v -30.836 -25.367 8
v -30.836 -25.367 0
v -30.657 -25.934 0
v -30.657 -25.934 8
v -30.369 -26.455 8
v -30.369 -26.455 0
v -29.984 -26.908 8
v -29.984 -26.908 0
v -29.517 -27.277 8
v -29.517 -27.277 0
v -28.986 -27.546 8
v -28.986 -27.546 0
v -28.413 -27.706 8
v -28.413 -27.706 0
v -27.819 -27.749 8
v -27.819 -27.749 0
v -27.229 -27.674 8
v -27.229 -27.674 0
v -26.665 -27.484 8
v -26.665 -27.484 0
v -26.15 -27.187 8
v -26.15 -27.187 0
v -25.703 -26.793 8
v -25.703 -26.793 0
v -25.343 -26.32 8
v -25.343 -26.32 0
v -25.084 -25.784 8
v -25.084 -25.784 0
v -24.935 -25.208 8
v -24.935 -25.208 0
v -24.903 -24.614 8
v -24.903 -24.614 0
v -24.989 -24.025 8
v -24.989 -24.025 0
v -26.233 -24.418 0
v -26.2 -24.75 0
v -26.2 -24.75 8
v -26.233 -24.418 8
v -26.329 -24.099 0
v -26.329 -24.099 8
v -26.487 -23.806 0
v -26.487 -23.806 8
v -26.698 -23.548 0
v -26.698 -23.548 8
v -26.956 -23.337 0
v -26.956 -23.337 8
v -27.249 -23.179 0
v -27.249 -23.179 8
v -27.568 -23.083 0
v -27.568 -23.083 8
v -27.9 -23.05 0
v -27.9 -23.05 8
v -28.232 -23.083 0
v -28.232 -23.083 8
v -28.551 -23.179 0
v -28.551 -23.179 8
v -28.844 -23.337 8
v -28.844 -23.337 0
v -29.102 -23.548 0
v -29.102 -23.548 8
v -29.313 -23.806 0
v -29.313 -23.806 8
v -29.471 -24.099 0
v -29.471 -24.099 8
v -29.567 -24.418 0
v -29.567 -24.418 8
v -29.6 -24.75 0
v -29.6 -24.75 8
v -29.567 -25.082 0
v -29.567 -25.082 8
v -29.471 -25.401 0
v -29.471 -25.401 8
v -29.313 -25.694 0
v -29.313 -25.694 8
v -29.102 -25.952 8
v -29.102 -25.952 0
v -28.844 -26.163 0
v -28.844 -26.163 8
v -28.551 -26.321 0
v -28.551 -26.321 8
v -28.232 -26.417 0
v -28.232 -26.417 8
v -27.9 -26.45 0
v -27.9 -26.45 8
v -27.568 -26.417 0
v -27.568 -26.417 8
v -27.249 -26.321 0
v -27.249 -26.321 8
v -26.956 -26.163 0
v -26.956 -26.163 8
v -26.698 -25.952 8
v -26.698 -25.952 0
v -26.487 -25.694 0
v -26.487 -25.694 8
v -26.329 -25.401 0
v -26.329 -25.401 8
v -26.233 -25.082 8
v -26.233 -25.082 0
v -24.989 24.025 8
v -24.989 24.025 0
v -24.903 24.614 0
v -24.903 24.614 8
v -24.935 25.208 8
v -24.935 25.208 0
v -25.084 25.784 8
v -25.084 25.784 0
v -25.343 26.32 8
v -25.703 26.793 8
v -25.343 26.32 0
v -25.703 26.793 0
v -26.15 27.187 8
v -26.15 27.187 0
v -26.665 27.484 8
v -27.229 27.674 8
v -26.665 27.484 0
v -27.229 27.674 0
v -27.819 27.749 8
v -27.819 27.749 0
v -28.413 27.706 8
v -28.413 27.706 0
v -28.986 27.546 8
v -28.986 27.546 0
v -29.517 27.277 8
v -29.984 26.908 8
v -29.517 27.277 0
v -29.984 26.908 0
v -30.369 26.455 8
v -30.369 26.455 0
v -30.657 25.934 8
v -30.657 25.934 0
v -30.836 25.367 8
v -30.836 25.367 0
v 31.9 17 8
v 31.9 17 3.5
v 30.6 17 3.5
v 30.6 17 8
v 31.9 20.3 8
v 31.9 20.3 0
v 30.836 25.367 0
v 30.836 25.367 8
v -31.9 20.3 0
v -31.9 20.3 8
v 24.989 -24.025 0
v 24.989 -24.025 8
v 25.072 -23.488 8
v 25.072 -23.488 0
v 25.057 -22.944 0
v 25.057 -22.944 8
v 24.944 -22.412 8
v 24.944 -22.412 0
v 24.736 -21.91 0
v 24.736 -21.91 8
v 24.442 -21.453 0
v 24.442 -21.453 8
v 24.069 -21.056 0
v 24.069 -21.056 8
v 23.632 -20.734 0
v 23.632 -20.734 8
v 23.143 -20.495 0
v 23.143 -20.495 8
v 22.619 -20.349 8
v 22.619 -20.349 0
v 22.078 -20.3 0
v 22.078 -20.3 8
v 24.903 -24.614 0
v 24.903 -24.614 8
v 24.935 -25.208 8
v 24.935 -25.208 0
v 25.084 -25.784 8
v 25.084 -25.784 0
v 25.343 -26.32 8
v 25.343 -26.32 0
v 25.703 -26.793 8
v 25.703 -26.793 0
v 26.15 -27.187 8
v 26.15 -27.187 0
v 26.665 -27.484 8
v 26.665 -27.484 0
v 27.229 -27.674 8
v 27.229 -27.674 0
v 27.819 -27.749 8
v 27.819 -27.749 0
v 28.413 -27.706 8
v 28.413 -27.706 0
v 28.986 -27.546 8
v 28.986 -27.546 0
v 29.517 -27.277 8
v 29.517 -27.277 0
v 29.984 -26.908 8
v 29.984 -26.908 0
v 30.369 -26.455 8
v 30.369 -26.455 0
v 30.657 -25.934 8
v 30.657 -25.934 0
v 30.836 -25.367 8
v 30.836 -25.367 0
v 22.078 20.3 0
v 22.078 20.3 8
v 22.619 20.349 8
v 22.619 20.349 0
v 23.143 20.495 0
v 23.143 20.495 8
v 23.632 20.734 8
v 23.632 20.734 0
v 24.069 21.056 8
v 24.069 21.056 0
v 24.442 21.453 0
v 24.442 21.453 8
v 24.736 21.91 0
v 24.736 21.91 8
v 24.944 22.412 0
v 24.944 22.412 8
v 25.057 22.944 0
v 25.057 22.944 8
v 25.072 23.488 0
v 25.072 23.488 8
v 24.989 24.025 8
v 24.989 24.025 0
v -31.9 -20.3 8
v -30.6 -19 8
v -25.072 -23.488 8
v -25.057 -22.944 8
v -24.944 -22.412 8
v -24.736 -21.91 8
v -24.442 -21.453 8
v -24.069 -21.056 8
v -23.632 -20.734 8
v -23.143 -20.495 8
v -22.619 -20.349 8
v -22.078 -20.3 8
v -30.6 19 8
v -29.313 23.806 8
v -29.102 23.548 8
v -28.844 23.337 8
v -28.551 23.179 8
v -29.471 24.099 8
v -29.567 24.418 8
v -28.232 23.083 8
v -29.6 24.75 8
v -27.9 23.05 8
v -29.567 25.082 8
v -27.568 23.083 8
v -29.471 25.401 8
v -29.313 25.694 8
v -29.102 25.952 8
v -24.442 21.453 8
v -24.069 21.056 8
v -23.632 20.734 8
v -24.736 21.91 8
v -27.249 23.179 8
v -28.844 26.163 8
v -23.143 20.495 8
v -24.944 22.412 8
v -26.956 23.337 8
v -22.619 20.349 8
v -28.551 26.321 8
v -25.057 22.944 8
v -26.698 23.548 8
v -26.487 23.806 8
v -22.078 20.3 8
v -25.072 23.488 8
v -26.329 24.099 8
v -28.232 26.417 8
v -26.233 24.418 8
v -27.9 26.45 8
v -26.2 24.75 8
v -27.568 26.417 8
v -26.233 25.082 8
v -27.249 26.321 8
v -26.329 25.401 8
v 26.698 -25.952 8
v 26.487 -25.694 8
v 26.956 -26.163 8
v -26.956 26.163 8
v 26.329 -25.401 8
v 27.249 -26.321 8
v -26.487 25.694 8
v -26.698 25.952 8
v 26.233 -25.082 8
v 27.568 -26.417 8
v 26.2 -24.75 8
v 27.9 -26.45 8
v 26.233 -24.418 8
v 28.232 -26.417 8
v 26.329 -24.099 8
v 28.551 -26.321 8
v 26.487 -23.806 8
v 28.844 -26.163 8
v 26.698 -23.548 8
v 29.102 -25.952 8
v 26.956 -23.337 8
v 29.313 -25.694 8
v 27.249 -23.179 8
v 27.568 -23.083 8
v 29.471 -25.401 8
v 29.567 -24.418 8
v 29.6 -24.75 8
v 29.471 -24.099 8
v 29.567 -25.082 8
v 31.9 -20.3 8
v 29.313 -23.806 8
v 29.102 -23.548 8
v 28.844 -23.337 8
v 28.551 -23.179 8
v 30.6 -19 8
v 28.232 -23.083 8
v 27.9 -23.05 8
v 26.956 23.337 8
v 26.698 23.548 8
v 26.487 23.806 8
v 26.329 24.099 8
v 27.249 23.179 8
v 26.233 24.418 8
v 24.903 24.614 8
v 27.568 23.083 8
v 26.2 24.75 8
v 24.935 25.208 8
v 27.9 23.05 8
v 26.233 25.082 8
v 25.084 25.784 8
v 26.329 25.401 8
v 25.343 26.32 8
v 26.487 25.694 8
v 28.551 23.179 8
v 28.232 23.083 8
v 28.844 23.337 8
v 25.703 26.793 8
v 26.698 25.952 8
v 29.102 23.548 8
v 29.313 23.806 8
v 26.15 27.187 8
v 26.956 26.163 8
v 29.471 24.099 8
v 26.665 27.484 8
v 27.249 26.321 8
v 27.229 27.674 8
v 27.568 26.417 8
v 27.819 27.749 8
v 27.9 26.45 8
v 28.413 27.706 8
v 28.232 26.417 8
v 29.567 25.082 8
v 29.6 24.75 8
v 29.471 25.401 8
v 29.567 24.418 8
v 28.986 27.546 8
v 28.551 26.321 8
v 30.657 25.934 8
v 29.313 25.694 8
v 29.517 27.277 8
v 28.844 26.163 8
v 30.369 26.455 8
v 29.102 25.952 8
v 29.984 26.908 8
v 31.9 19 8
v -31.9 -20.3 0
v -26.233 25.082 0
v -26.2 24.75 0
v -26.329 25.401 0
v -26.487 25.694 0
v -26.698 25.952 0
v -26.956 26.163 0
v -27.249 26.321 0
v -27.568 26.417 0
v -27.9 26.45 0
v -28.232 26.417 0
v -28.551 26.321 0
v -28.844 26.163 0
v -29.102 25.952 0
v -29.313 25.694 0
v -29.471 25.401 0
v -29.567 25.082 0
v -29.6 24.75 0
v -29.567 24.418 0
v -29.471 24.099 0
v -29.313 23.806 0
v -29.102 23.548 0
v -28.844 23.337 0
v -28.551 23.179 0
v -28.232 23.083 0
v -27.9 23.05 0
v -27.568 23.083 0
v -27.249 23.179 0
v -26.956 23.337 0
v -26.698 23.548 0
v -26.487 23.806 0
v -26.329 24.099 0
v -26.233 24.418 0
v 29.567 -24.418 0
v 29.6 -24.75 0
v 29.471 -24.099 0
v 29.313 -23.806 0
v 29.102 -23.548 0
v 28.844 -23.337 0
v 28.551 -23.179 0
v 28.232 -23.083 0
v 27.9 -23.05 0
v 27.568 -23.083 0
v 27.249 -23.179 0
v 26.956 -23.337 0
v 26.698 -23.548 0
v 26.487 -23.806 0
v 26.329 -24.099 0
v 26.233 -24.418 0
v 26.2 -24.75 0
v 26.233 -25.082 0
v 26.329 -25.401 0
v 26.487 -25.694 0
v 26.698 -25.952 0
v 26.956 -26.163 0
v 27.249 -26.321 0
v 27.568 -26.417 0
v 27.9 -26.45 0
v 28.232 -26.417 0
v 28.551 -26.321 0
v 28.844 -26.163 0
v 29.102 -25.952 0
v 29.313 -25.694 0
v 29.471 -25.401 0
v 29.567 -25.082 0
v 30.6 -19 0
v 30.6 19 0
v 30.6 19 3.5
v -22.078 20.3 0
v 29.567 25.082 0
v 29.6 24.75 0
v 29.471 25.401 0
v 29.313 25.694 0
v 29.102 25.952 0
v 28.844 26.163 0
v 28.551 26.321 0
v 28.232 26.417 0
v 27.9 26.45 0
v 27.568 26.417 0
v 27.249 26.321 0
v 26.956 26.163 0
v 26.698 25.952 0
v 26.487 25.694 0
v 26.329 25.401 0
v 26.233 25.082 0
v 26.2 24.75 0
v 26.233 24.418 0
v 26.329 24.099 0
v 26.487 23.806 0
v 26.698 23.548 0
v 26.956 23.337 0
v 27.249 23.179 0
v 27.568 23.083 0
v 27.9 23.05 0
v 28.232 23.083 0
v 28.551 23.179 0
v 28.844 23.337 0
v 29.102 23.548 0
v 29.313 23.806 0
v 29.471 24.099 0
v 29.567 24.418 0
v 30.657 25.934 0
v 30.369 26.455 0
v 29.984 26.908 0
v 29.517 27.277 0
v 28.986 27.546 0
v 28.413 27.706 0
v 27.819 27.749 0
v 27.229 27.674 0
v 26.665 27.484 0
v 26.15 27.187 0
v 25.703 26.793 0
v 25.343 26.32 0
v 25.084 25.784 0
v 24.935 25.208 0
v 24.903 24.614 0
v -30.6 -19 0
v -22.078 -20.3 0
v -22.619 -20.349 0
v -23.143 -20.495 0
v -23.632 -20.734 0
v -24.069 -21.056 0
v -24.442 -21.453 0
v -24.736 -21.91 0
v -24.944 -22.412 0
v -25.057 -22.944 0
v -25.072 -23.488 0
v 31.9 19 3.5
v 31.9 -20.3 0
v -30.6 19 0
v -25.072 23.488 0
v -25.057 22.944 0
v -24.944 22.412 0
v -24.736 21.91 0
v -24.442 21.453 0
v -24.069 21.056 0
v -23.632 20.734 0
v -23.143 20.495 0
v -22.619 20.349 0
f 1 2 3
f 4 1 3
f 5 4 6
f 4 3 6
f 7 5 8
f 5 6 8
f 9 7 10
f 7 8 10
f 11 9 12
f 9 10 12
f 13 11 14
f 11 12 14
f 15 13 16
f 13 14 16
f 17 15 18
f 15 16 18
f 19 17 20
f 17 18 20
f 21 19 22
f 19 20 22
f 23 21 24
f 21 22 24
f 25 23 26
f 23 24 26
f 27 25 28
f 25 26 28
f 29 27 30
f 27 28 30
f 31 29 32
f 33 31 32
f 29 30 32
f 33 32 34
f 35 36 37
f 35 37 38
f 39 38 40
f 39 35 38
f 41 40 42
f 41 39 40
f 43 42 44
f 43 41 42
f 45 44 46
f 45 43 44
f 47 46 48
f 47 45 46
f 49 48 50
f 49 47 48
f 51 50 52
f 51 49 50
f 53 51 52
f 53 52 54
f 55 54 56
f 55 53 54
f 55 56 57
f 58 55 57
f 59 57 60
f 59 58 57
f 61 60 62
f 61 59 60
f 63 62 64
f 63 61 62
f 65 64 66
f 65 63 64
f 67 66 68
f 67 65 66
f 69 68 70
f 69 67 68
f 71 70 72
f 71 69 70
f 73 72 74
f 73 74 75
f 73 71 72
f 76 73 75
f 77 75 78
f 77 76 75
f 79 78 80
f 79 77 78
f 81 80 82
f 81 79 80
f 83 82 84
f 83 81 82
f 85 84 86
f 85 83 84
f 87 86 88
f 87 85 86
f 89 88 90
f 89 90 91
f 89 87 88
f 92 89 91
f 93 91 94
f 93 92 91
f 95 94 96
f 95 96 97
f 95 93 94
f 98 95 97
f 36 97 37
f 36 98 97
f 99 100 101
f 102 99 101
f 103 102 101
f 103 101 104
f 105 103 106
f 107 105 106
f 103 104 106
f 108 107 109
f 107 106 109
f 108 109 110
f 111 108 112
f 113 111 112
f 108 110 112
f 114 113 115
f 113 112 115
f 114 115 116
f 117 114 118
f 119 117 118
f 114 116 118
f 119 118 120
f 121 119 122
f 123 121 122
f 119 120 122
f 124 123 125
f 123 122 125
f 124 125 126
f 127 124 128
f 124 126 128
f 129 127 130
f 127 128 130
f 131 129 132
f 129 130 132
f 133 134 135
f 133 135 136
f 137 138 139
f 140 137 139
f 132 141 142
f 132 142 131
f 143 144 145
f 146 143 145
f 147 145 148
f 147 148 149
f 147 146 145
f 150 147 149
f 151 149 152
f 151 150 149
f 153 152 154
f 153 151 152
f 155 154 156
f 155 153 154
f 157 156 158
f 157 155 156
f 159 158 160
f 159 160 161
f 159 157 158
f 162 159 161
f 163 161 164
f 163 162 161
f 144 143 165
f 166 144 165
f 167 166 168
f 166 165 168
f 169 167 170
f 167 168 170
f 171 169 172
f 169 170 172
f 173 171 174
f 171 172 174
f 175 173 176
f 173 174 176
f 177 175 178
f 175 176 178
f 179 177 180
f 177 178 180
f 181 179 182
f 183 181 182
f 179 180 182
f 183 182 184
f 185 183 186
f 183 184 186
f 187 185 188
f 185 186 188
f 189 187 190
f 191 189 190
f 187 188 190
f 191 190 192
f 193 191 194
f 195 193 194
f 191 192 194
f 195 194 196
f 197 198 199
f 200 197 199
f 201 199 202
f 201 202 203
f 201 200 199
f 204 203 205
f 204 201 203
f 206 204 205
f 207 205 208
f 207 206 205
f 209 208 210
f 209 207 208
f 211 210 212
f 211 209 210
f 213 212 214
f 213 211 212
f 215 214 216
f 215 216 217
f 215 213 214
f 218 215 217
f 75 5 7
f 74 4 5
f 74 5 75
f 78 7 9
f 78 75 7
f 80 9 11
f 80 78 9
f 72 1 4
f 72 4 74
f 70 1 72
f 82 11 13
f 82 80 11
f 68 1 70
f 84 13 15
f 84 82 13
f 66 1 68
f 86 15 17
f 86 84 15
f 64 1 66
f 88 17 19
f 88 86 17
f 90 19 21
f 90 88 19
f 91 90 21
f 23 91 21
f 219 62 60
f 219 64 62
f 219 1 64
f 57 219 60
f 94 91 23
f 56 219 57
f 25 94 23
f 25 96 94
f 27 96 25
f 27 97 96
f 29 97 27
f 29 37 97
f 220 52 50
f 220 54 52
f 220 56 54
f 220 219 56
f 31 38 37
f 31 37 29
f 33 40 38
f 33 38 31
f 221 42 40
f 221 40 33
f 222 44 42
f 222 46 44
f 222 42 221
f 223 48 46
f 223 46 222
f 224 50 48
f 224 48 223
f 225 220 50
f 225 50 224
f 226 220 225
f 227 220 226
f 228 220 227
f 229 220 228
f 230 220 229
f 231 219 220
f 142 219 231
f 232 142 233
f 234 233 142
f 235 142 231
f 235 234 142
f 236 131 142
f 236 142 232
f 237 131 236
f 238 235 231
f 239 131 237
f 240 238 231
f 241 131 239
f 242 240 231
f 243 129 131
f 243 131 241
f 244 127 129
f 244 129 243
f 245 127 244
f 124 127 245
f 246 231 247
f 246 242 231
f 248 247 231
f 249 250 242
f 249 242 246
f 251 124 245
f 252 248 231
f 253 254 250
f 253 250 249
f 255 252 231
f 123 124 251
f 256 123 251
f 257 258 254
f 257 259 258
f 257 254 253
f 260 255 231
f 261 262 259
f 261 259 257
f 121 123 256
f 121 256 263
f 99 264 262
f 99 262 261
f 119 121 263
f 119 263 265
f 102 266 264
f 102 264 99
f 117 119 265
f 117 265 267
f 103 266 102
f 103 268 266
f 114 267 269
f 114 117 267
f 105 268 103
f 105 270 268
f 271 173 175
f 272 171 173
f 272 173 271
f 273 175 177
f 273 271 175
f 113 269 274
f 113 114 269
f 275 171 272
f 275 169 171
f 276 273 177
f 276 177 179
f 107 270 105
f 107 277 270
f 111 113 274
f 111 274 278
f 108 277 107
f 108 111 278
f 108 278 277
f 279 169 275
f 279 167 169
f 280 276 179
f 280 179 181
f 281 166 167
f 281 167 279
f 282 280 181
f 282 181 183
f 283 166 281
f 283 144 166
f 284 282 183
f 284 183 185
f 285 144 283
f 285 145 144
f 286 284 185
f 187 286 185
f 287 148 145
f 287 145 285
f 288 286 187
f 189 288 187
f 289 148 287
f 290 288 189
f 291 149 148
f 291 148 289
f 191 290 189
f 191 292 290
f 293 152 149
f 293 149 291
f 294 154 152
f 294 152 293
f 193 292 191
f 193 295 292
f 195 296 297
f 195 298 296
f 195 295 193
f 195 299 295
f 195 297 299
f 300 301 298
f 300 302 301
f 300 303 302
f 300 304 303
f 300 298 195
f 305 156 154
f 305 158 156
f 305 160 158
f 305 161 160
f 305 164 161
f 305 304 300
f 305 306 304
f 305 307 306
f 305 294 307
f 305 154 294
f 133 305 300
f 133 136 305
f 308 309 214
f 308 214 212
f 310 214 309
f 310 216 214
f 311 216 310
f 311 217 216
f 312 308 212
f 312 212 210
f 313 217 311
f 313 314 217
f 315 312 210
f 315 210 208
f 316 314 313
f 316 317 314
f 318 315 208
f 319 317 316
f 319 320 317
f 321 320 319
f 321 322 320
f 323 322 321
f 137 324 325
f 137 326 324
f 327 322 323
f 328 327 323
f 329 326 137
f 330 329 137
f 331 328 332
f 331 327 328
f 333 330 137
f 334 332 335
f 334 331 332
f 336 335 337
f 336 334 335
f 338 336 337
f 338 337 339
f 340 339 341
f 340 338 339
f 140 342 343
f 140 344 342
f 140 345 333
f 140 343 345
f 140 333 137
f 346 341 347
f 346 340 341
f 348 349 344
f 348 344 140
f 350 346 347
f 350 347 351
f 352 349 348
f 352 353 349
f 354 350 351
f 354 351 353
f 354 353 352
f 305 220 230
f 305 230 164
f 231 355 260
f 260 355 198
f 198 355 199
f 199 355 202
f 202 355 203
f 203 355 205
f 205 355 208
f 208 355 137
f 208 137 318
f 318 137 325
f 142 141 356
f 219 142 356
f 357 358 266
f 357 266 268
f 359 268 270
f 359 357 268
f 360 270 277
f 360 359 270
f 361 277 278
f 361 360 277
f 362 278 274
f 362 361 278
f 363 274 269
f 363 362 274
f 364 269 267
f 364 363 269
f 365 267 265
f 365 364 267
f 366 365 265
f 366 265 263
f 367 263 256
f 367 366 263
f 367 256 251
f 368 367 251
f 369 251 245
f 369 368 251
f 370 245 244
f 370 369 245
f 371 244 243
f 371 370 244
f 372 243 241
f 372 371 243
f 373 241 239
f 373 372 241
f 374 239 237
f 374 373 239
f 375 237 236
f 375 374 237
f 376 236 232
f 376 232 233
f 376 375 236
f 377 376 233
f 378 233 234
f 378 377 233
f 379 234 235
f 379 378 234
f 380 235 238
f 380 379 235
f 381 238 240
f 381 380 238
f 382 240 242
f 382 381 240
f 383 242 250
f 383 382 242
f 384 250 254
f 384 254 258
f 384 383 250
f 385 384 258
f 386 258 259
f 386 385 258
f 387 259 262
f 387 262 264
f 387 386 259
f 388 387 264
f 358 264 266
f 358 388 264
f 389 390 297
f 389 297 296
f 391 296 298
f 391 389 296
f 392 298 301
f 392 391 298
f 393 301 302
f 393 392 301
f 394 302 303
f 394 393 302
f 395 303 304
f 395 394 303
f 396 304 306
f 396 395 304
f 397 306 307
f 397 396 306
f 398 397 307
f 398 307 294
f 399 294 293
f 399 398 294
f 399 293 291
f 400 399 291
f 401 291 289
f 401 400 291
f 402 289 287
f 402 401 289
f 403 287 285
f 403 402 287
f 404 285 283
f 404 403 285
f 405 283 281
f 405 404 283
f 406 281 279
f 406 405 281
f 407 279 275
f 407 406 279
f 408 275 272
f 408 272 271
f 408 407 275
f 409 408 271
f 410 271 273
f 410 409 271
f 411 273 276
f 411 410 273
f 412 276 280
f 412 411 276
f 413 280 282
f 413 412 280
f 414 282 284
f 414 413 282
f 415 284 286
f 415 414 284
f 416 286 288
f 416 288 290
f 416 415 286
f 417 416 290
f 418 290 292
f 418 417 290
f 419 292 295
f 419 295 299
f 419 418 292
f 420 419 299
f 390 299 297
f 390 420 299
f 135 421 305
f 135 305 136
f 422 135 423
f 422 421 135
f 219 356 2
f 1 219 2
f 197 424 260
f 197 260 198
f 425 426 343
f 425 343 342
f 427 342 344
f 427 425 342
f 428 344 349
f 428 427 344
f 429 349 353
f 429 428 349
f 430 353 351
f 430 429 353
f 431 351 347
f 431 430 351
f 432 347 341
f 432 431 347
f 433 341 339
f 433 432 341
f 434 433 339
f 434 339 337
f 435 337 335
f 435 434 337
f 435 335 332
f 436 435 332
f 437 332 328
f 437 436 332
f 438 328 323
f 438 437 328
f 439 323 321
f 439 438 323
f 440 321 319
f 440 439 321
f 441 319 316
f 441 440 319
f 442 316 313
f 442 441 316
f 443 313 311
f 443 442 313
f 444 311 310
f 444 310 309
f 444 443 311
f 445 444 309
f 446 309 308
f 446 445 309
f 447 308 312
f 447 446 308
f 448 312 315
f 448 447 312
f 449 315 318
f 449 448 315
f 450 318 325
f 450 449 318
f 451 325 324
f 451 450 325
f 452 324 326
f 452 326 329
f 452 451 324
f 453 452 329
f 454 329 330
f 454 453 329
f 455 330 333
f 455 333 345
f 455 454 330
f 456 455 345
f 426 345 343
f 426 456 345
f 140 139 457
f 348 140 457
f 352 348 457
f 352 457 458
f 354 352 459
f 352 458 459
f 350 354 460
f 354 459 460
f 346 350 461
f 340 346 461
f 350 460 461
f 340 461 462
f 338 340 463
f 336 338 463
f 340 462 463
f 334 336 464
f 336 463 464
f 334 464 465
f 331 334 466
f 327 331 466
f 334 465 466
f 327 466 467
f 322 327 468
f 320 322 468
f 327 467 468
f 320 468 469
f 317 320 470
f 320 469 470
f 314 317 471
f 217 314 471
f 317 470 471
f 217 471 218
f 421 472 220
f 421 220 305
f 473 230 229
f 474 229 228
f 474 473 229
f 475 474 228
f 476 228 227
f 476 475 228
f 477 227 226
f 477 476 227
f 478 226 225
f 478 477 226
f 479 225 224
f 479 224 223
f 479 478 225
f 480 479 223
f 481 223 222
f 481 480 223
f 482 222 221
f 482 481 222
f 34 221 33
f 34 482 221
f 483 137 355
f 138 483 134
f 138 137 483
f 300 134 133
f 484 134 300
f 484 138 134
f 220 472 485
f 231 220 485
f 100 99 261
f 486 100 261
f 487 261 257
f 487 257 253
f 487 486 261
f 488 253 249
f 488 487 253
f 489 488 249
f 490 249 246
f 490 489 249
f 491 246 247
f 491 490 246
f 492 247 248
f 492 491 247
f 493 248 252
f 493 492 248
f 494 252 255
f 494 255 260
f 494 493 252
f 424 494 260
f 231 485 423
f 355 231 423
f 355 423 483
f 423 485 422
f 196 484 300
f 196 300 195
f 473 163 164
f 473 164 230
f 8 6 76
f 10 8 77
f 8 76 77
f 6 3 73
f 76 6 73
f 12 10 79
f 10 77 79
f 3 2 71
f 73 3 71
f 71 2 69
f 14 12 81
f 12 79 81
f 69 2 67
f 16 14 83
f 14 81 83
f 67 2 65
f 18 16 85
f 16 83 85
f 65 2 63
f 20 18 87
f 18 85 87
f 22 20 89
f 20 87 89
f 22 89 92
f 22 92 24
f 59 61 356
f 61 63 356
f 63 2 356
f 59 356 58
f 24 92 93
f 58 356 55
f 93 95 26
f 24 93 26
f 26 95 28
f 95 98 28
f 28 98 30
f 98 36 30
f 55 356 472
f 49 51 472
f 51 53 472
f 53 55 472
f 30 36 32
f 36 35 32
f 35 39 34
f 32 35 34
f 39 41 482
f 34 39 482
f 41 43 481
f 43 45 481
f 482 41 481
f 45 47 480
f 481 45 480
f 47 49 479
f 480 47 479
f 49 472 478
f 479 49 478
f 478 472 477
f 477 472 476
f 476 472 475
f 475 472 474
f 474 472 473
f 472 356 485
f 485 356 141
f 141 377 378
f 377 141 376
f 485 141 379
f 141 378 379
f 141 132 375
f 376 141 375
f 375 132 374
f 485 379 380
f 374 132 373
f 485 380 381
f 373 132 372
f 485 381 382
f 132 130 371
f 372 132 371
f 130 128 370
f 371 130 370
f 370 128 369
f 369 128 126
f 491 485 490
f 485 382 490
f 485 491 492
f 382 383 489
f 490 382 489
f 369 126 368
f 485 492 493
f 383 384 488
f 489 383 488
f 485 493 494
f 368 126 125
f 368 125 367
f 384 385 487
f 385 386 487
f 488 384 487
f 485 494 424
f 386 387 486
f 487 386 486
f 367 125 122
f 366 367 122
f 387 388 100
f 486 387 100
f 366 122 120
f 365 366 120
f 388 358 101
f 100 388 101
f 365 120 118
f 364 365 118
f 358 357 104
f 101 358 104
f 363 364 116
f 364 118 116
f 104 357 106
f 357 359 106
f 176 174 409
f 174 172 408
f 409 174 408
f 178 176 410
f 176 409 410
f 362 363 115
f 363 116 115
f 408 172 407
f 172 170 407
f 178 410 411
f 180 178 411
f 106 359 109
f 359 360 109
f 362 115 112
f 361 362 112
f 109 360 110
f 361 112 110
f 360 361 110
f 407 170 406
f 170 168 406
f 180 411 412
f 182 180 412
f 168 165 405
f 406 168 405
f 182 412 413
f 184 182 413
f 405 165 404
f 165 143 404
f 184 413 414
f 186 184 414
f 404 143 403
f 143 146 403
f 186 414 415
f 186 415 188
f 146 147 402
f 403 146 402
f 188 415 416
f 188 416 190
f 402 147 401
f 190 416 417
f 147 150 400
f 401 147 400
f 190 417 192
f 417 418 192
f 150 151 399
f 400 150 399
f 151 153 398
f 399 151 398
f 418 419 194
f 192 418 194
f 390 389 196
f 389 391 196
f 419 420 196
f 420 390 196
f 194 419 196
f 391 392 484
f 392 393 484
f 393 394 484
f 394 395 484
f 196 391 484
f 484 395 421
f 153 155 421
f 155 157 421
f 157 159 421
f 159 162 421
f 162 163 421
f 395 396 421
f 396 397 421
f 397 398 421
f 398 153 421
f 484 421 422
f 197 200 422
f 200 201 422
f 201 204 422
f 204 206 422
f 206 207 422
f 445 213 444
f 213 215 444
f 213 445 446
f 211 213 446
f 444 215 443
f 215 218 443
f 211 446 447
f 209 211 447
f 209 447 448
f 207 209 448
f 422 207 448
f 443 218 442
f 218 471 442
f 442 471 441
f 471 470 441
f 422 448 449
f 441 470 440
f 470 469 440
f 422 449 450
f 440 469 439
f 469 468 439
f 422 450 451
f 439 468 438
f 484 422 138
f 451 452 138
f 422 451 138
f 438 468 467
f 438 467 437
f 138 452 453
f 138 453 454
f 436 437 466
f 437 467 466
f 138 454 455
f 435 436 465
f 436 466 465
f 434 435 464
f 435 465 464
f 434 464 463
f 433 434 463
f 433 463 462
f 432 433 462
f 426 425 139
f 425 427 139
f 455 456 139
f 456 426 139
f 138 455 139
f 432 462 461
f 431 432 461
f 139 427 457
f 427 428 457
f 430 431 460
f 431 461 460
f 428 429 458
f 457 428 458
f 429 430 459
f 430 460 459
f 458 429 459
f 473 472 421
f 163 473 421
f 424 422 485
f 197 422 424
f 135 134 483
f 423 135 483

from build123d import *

# Parameters (mm, degrees)
SKETCH_R     = 1.7
SKETCH_W     = 61.2
SKETCH_H     = 38
PAD_DEPTH    = 8
SKETCH001_W  = 2
SKETCH001_H  = 4.5
POCKET_DEPTH = 1.3


with BuildPart() as part:
    # Sketch → Pad (new body)
    with BuildSketch(Plane.XY):
        with BuildLine():
            Line((-31.9, 20.3), (-31.9, -20.3))
            Line((-31.9, -20.3), (-30.835954, -25.366584))
            ThreePointArc((-30.835954, -25.366584), (-27.229087, -27.674017), (-24.988925, -24.024987))
            ThreePointArc((-22.077844, -20.3), (-24.441629, -21.4527), (-24.988925, -24.024987))
            Line((22.077844, -20.3), (-22.077844, -20.3))
            ThreePointArc((24.988925, -24.024987), (24.441629, -21.452699), (22.077844, -20.3))
            ThreePointArc((24.988925, -24.024987), (27.229087, -27.674017), (30.835954, -25.366583))
            Line((31.9, -20.3), (30.835954, -25.366583))
            Line((31.9, 20.3), (31.9, -20.3))
            Line((31.9, 20.3), (30.835954, 25.366583))
            ThreePointArc((30.835954, 25.366583), (27.229093, 27.674018), (24.988922, 24.025))
            ThreePointArc((22.077844, 20.3), (24.441633, 21.452705), (24.988922, 24.025))
            Line((-22.077844, 20.3), (22.077844, 20.3))
            ThreePointArc((-24.988922, 24.025), (-24.441633, 21.452705), (-22.077844, 20.3))
            ThreePointArc((-24.988922, 24.025), (-27.229093, 27.674018), (-30.835954, 25.366584))
            Line((-31.9, 20.3), (-30.835954, 25.366584))
        make_face()
        with Locations((-27.9, -24.75)):
            Circle(SKETCH_R, mode=Mode.SUBTRACT)
        with Locations((27.9, -24.75)):
            Circle(SKETCH_R, mode=Mode.SUBTRACT)
        with Locations((27.9, 24.75)):
            Circle(SKETCH_R, mode=Mode.SUBTRACT)
        with Locations((-27.9, 24.75)):
            Circle(SKETCH_R, mode=Mode.SUBTRACT)
        Rectangle(SKETCH_W, SKETCH_H, mode=Mode.SUBTRACT)
    extrude(amount=PAD_DEPTH)

    # Sketch001 → Pocket (cut)
    with BuildSketch(Plane.YZ.offset(31.9)):
        with Locations((18, 5.75)):
            Rectangle(SKETCH001_W, SKETCH001_H)
    extrude(amount=-POCKET_DEPTH, mode=Mode.SUBTRACT)


solid = part.part
